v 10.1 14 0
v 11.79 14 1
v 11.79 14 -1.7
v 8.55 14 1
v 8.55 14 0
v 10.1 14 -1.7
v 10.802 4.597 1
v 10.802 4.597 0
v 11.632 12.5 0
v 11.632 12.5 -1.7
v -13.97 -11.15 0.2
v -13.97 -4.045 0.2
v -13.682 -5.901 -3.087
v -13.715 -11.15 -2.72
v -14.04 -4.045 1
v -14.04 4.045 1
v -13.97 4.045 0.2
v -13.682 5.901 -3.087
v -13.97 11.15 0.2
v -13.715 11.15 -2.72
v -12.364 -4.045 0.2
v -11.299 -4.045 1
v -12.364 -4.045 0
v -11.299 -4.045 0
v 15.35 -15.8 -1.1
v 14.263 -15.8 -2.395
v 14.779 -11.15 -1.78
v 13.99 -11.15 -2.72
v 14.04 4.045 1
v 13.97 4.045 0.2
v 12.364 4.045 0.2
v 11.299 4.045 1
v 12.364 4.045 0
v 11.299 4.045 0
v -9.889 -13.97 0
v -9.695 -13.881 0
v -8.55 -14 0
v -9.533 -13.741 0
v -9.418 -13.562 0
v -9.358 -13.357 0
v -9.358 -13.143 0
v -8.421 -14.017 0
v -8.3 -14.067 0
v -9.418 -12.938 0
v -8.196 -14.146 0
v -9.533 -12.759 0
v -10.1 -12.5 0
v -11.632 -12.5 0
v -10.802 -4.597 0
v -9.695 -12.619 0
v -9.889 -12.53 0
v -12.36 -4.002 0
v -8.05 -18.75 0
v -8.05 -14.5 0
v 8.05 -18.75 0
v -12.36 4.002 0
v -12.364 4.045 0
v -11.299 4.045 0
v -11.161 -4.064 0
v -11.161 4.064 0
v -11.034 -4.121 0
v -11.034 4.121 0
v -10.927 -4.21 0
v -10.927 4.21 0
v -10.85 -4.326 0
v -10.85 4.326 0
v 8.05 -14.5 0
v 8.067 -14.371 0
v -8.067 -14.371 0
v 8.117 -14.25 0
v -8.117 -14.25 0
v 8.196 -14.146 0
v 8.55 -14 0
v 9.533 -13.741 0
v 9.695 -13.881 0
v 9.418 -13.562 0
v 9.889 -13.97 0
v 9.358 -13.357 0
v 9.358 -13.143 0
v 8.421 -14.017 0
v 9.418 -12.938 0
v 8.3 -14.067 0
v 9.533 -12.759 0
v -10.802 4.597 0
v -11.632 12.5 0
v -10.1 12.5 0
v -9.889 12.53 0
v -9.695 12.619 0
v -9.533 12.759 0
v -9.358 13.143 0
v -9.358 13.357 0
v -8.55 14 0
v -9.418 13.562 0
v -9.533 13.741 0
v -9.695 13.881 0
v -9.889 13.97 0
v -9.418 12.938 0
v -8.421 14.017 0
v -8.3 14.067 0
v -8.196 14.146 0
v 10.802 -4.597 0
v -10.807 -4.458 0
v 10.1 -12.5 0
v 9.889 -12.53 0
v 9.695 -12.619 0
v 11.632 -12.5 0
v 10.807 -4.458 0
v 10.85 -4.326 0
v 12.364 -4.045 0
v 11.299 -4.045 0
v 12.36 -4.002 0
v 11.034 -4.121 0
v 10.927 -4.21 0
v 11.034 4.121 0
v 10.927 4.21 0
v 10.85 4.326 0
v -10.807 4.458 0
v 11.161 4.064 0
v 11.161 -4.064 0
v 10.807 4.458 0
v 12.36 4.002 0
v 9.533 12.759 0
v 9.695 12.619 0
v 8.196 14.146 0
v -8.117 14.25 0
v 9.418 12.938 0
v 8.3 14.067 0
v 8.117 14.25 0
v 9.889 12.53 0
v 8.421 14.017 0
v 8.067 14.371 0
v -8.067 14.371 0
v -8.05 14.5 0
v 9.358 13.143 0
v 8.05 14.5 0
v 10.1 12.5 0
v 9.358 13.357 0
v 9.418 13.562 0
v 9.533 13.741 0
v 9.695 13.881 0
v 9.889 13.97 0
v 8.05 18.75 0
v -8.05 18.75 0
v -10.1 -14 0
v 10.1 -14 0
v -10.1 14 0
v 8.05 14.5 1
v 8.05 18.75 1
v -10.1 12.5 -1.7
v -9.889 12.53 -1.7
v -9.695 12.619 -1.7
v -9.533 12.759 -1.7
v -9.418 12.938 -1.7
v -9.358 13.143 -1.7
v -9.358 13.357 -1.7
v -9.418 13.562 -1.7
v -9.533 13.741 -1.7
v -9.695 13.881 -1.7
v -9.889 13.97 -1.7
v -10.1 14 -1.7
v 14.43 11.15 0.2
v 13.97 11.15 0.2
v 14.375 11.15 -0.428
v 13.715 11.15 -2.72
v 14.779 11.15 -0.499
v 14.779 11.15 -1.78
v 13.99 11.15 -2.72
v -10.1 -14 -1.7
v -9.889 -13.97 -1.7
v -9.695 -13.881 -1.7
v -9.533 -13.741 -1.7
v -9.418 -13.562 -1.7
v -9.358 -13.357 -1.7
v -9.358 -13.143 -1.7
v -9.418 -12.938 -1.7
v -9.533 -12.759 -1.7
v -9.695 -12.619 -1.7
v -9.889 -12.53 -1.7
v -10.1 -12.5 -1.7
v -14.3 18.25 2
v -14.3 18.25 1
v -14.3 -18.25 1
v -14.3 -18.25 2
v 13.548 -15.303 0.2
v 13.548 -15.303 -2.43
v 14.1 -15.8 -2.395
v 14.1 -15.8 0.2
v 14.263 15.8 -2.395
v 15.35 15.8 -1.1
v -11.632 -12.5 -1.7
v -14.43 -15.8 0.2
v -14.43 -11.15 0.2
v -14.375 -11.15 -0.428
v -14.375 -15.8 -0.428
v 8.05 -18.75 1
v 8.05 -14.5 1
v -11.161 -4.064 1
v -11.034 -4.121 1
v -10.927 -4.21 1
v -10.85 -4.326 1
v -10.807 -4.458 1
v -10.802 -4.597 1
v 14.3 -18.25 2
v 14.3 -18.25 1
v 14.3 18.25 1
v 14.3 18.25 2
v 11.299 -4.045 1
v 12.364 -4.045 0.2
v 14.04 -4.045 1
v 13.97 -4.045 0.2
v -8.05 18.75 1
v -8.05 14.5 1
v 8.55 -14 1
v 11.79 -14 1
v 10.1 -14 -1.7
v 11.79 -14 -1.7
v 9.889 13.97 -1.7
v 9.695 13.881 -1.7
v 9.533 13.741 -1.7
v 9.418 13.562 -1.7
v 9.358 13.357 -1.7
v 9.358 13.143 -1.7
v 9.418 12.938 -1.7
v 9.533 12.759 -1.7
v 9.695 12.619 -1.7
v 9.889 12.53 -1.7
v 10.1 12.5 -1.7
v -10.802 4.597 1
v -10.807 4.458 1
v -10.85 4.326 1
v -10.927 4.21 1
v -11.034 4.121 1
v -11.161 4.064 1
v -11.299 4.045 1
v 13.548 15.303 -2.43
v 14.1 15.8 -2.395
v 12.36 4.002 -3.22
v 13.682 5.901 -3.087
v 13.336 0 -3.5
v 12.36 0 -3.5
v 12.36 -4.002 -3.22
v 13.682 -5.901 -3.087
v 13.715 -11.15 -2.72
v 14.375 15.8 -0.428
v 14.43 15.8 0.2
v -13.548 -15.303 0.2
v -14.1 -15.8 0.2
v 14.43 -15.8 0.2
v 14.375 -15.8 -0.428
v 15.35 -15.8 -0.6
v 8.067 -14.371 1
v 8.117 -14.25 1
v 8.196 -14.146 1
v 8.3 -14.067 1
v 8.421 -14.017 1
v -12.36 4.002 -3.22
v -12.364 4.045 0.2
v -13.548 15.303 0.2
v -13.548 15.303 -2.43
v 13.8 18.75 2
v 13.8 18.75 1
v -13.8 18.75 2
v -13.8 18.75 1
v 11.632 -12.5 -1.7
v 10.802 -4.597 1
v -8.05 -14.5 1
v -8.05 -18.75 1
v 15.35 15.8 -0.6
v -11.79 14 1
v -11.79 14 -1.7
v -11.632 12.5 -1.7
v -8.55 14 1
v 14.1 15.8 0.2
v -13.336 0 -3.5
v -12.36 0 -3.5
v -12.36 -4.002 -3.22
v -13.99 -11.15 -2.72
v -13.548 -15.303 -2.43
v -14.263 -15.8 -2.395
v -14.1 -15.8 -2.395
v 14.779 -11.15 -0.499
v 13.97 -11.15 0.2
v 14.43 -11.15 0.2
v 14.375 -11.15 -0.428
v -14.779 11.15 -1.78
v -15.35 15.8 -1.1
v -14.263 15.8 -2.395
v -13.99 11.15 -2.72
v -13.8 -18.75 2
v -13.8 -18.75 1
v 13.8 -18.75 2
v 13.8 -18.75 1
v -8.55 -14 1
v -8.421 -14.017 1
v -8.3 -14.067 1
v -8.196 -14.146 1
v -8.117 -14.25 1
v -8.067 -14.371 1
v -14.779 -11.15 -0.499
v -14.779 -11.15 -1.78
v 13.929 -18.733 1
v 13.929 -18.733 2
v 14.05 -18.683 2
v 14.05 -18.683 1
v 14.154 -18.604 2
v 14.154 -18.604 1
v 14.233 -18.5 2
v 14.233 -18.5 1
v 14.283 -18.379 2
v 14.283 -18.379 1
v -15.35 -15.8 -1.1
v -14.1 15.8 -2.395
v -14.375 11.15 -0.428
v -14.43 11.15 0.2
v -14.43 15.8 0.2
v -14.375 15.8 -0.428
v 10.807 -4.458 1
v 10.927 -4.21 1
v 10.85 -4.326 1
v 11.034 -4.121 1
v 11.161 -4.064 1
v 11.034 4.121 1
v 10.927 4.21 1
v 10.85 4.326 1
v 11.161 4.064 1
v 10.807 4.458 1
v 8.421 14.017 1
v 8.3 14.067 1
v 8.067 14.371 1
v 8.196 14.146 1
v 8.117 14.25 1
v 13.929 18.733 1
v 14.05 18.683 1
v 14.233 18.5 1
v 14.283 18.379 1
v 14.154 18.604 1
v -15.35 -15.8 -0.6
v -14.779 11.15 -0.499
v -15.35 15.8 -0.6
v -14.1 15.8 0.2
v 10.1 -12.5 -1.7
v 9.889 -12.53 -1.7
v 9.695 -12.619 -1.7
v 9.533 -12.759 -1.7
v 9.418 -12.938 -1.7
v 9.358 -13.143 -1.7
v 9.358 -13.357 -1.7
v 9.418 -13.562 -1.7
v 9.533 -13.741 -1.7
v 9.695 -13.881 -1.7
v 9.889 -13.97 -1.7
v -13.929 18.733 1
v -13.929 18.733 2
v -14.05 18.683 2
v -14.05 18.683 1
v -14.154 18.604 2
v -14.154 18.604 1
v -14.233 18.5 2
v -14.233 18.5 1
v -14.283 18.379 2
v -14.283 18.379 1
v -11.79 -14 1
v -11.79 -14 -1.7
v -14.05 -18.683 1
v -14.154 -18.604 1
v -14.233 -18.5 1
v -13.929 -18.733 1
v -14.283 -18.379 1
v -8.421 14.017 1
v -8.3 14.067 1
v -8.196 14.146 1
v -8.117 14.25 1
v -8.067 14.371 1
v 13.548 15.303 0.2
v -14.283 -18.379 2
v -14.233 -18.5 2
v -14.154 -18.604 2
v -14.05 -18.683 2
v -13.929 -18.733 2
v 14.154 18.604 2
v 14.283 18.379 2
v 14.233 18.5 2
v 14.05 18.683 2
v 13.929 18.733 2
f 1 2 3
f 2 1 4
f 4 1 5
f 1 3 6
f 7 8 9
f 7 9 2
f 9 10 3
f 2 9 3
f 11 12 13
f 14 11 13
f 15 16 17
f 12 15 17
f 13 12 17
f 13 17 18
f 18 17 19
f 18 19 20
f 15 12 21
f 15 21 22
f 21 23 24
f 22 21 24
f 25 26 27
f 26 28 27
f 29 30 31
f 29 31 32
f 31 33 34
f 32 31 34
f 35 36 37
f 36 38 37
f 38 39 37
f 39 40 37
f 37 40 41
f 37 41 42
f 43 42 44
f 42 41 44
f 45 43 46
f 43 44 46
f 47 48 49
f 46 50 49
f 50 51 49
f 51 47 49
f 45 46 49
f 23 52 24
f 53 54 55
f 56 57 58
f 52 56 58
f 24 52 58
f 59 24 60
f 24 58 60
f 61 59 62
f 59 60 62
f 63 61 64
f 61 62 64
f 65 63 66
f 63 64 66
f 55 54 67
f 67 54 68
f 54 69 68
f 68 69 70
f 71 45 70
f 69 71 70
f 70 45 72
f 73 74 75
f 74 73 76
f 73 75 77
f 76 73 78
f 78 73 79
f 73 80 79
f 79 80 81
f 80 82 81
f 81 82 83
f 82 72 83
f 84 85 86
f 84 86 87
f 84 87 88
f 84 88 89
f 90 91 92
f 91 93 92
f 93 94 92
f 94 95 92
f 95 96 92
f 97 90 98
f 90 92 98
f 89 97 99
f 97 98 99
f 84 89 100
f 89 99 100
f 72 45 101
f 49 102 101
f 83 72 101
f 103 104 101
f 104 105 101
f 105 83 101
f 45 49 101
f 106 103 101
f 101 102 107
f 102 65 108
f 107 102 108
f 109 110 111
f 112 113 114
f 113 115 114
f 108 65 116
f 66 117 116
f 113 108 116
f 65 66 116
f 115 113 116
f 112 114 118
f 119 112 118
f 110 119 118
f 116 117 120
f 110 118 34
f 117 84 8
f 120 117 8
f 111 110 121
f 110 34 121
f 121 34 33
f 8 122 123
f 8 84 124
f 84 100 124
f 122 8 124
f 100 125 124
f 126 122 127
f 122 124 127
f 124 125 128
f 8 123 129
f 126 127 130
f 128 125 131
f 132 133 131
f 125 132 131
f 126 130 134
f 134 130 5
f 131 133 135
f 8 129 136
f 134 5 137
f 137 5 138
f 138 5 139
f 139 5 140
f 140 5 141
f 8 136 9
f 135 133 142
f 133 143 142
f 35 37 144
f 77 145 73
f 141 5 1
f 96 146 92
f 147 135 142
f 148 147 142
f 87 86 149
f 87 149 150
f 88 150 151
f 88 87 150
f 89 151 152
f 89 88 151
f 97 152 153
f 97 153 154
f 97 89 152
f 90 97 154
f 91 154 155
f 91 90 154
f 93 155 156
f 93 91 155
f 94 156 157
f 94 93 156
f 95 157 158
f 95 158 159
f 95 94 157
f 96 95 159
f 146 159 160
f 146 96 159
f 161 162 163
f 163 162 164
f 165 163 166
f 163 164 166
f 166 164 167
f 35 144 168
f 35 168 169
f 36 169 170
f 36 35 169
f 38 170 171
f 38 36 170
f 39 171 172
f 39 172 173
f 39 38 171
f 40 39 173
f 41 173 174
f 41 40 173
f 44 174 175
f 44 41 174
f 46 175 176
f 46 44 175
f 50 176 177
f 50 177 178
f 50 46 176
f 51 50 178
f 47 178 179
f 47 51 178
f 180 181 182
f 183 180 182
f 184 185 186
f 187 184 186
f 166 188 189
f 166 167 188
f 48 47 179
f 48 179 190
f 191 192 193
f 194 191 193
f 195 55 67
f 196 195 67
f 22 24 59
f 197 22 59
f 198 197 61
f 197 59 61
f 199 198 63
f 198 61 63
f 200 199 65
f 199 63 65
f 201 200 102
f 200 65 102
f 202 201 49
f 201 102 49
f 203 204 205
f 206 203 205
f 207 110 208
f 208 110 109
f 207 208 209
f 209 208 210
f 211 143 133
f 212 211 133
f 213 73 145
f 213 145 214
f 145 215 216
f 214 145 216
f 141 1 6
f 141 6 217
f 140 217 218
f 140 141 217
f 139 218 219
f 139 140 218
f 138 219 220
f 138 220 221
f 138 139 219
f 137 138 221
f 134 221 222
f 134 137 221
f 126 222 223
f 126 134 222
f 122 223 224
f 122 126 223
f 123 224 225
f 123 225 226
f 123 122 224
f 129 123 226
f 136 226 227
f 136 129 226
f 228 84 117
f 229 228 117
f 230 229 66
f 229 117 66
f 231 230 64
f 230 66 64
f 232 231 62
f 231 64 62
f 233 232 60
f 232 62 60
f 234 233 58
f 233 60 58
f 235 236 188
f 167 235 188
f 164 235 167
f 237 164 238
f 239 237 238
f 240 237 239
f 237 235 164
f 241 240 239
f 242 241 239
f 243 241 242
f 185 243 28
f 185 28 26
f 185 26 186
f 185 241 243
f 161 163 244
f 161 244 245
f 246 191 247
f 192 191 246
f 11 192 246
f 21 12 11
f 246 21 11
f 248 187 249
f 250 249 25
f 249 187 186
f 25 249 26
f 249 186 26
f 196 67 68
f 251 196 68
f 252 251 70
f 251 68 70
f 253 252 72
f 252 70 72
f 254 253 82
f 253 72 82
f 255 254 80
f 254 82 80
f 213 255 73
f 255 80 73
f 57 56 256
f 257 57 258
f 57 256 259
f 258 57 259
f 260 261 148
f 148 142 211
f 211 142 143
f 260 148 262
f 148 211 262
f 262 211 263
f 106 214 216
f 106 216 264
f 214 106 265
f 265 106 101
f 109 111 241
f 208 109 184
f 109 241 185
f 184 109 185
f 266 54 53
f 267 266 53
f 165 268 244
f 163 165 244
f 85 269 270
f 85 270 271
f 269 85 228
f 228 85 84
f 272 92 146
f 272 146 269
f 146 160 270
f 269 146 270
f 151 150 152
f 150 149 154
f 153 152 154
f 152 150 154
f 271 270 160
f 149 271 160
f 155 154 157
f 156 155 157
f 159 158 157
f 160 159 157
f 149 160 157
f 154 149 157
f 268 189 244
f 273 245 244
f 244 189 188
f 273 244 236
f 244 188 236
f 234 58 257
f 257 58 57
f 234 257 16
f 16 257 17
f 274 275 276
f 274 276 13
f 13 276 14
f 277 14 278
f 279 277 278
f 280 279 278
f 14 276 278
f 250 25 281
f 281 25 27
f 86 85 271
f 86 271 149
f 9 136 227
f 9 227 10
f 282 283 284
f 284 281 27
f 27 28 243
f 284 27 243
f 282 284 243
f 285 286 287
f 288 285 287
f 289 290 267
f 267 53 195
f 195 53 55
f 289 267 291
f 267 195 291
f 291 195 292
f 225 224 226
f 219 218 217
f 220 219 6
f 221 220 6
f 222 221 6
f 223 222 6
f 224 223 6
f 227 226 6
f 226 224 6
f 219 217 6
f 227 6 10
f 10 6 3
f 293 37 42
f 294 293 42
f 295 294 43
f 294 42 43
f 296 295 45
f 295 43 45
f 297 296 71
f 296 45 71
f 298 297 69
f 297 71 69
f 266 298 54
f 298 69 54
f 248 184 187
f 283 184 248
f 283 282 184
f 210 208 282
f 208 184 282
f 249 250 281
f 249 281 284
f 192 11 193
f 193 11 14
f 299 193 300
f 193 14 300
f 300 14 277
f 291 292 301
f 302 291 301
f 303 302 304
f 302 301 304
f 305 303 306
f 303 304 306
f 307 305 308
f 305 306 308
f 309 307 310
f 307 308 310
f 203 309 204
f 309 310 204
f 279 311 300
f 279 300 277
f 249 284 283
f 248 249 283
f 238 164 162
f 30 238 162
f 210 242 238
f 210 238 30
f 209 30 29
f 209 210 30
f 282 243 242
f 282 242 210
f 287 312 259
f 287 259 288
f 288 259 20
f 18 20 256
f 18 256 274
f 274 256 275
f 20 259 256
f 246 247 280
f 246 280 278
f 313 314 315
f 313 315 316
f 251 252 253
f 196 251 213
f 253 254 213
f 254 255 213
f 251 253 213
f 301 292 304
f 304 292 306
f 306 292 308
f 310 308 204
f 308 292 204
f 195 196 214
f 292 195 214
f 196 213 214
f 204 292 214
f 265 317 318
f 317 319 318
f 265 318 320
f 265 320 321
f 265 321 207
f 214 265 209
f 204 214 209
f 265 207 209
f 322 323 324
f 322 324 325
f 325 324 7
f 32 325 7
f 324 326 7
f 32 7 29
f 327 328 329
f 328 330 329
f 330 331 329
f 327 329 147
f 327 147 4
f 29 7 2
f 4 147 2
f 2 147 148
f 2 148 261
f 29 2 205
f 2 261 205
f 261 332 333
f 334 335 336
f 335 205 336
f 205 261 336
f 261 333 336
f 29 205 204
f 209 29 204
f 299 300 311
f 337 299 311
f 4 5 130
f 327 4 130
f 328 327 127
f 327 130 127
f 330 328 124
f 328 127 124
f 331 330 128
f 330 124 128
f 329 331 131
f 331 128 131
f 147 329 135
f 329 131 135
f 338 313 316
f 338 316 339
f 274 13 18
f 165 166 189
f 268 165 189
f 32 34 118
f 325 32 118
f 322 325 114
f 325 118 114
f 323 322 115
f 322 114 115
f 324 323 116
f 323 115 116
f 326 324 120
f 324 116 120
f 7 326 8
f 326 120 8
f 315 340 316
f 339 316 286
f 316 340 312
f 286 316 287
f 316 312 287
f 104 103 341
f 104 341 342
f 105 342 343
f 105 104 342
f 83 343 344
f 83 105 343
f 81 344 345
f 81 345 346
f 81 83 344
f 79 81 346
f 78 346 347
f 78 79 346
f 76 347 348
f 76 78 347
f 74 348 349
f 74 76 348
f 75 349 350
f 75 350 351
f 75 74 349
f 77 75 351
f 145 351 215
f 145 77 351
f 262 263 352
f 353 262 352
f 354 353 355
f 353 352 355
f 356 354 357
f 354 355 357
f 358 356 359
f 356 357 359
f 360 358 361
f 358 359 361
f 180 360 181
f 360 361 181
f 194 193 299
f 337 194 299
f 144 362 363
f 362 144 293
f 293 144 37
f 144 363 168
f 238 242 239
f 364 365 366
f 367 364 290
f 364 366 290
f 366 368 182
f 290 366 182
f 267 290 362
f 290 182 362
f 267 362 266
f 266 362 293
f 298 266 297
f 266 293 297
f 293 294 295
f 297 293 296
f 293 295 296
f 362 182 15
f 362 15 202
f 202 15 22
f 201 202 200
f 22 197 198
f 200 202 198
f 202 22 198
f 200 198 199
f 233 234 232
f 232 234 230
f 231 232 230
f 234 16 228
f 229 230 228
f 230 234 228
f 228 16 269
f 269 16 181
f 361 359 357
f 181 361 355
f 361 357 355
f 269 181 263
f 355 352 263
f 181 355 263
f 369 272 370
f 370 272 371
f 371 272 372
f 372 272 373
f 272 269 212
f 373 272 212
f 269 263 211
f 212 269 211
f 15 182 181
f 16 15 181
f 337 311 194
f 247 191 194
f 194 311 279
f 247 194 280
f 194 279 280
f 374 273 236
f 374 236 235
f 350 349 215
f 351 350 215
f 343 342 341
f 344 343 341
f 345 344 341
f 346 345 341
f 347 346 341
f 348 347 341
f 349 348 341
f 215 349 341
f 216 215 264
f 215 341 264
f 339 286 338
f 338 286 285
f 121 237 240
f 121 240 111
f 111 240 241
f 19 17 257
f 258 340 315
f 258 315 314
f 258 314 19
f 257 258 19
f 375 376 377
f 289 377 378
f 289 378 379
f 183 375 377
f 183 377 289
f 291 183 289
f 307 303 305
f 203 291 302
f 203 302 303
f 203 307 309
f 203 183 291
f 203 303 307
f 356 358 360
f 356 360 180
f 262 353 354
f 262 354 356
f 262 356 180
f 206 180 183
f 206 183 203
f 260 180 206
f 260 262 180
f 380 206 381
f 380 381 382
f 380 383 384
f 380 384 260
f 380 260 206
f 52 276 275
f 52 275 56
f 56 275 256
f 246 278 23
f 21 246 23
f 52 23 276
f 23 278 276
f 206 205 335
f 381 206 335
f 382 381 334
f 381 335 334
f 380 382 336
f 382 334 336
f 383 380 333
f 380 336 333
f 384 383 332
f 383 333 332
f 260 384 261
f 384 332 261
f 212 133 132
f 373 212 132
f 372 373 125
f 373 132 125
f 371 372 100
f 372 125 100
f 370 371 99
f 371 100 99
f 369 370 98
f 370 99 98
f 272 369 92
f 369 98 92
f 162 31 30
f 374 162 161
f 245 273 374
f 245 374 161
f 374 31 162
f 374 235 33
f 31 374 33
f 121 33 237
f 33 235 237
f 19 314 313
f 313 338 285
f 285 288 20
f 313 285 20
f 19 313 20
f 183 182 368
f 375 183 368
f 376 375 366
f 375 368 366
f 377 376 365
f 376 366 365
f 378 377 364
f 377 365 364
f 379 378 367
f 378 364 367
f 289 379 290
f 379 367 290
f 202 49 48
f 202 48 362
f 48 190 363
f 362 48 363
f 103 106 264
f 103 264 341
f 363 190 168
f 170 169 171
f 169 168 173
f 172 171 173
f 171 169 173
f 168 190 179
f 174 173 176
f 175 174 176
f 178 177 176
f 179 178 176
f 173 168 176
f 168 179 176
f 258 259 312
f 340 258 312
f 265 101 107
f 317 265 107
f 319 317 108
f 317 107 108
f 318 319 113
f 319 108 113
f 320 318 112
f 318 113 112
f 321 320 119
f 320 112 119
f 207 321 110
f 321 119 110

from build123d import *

# Parameters (mm, degrees)
BOSS_EXTRUDE1_DEPTH      = 2
BOSS_EXTRUDE2_DEPTH      = 1.7
BOSS_EXTRUDE2_DEPTH_BACK = 1.7
BOSS_EXTRUDE3_DEPTH      = 1.7
BOSS_EXTRUDE3_DEPTH_BACK = 1.7
BOSS_EXTRUDE4_DEPTH      = 1.7
BOSS_EXTRUDE4_DEPTH_BACK = 1.7
BOSS_EXTRUDE5_DEPTH      = 1.7
BOSS_EXTRUDE5_DEPTH_BACK = 1.7
SKETCH6_W                = 38.6
SKETCH6_H                = 47.5
CUT_EXTRUDE1_DEPTH       = 4
BOSS_EXTRUDE6_DEPTH      = 3.8
BOSS_EXTRUDE7_DEPTH      = 3.8
CUT_EXTRUDE2_DEPTH       = 20
CUT_EXTRUDE2_DEPTH_BACK  = 20
CUT_EXTRUDE3_DEPTH       = 11.15
CUT_EXTRUDE3_DEPTH_BACK  = 11.15
CUT_EXTRUDE4_DEPTH       = 11.15
CUT_EXTRUDE4_DEPTH_BACK  = 11.15
CUT_EXTRUDE5_DEPTH       = 16
CUT_EXTRUDE5_DEPTH_BACK  = 16
CUT_EXTRUDE6_DEPTH       = 16
CUT_EXTRUDE6_DEPTH_BACK  = 16


with BuildPart() as part:
    # Sketch1 → Boss-Extrude1 (new body)
    with BuildSketch(Plane.XY):
        with BuildLine():
            Line((-14.3, 18.25), (-14.3, -18.25))
            ThreePointArc((-14.3, -18.25), (-14.153553391, -18.603553391), (-13.8, -18.75))
            Line((-13.8, -18.75), (13.8, -18.75))
            ThreePointArc((13.8, -18.75), (14.153553391, -18.603553391), (14.3, -18.25))
            Line((14.3, -18.25), (14.3, 18.25))
            ThreePointArc((14.3, 18.25), (14.153553391, 18.603553391), (13.8, 18.75))
            Line((13.8, 18.75), (-13.8, 18.75))
            ThreePointArc((-13.8, 18.75), (-14.153553391, 18.603553391), (-14.3, 18.25))
        make_face()
    extrude(amount=BOSS_EXTRUDE1_DEPTH)

    # Sketch2 → Boss-Extrude2 (add, two sides: drawn at the far end of the back side and taken through both)
    with BuildSketch(Plane.XY.offset(-BOSS_EXTRUDE2_DEPTH_BACK)):
        with BuildLine():
            Line((-13.1, 12.5), (-10.1, 12.5))
            ThreePointArc((-10.1, 12.5), (-9.35, 13.25), (-10.1, 14))
            Line((-10.1, 14), (-13.1, 14))
            Line((-13.1, 14), (-13.1, 12.5))
        make_face()
    extrude(amount=BOSS_EXTRUDE2_DEPTH + BOSS_EXTRUDE2_DEPTH_BACK)

    # Sketch3 → Boss-Extrude3 (add, two sides: drawn at the far end of the back side and taken through both)
    with BuildSketch(Plane.XY.offset(-BOSS_EXTRUDE3_DEPTH_BACK)):
        with BuildLine():
            Line((10.1, -14), (13.1, -14))
            Line((13.1, -14), (13.1, -12.5))
            Line((13.1, -12.5), (10.1, -12.5))
            ThreePointArc((10.1, -12.5), (9.35, -13.25), (10.1, -14))
        make_face()
    extrude(amount=BOSS_EXTRUDE3_DEPTH + BOSS_EXTRUDE3_DEPTH_BACK)

    # Sketch4 → Boss-Extrude4 (add, two sides: drawn at the far end of the back side and taken through both)
    with BuildSketch(Plane.XY.offset(-BOSS_EXTRUDE4_DEPTH_BACK)):
        with BuildLine():
            Line((-13.1, -12.5), (-13.1, -14))
            Line((-13.1, -14), (-10.1, -14))
            ThreePointArc((-10.1, -14), (-9.35, -13.25), (-10.1, -12.5))
            Line((-10.1, -12.5), (-13.1, -12.5))
        make_face()
    extrude(amount=BOSS_EXTRUDE4_DEPTH + BOSS_EXTRUDE4_DEPTH_BACK)

    # Sketch5 → Boss-Extrude5 (add, two sides: drawn at the far end of the back side and taken through both)
    with BuildSketch(Plane.XY.offset(-BOSS_EXTRUDE5_DEPTH_BACK)):
        with BuildLine():
            Line((10.1, 12.5), (13.1, 12.5))
            Line((13.1, 12.5), (13.1, 14))
            Line((13.1, 14), (10.1, 14))
            ThreePointArc((10.1, 14), (9.35, 13.25), (10.1, 12.5))
        make_face()
    extrude(amount=BOSS_EXTRUDE5_DEPTH + BOSS_EXTRUDE5_DEPTH_BACK)

    # Sketch6 → Cut-Extrude1 (cut)
    with BuildSketch(Plane.XY.offset(-3)):
        Rectangle(SKETCH6_W, SKETCH6_H)
        with BuildLine():
            Line((-14.3, -4.045), (-11.298993595, -4.045))
            ThreePointArc((-11.298993595, -4.045), (-10.927421183, -4.210434697), (-10.801732648, -4.597264232))
            Line((-10.801732648, -4.597264232), (-11.79, -14))
            Line((-11.79, -14), (-8.55, -14))
            ThreePointArc((-8.55, -14), (-8.196446609, -14.146446609), (-8.05, -14.5))
            Line((-8.05, -14.5), (-8.05, -18.75))
            Line((-8.05, -18.75), (8.05, -18.75))
            Line((8.05, -18.75), (8.05, -14.5))
            ThreePointArc((8.05, -14.5), (8.196446609, -14.146446609), (8.55, -14))
            Line((8.55, -14), (11.79, -14))
            Line((11.79, -14), (10.801732648, -4.597264232))
            ThreePointArc((10.801732648, -4.597264232), (10.927421183, -4.210434697), (11.298993595, -4.045))
            Line((11.298993595, -4.045), (14.3, -4.045))
            Line((14.3, -4.045), (14.3, 4.045))
            Line((14.3, 4.045), (11.298993595, 4.045))
            ThreePointArc((11.298993595, 4.045), (10.927421183, 4.210434697), (10.801732648, 4.597264232))
            Line((10.801732648, 4.597264232), (11.79, 14))
            Line((11.79, 14), (8.55, 14))
            ThreePointArc((8.55, 14), (8.196446609, 14.146446609), (8.05, 14.5))
            Line((8.05, 14.5), (8.05, 18.75))
            Line((8.05, 18.75), (-8.05, 18.75))
            Line((-8.05, 18.75), (-8.05, 14.5))
            ThreePointArc((-8.05, 14.5), (-8.196446609, 14.146446609), (-8.55, 14))
            Line((-8.55, 14), (-11.79, 14))
            Line((-11.79, 14), (-10.801732648, 4.597264232))
            ThreePointArc((-10.801732648, 4.597264232), (-10.927421183, 4.210434697), (-11.298993595, 4.045))
            Line((-11.298993595, 4.045), (-14.3, 4.045))
            Line((-14.3, 4.045), (-14.3, -4.045))
        make_face(mode=Mode.SUBTRACT)
    extrude(amount=CUT_EXTRUDE1_DEPTH, mode=Mode.SUBTRACT)

    # Sketch7 → Boss-Extrude6 (add)
    with BuildSketch(Plane.XY.offset(-3.6)):
        Polygon((12.36, -4.002188077), (13.547735768, -15.302739052), (14.1, -15.8), (15.35, -15.8), (14.779051792, -11.15), (14.04, -11.15), (14.04, 11.15), (14.779051792, 11.15), (15.35, 15.8), (14.1, 15.8), (13.547735768, 15.302739052), (12.36, 4.002188077), align=None)
    extrude(amount=BOSS_EXTRUDE6_DEPTH)

    # Sketch8 → Boss-Extrude7 (add)
    with BuildSketch(Plane.XY.offset(-3.6)):
        Polygon((-15.35, -15.8), (-14.1, -15.8), (-13.547735768, -15.302739052), (-12.36, -4.002188077), (-12.36, 4.002188077), (-13.547735768, 15.302739052), (-14.1, 15.8), (-15.35, 15.8), (-14.779051792, 11.15), (-14.04, 11.15), (-14.04, -11.15), (-14.779051792, -11.15), align=None)
    extrude(amount=BOSS_EXTRUDE7_DEPTH)

    # Sketch9 → Cut-Extrude2 (cut, two sides: drawn at the far end of the back side and taken through both)
    with BuildSketch(Plane(origin=(0, 0, 0), x_dir=(0, 0, -1), z_dir=(1, 0, 0)).offset(-CUT_EXTRUDE2_DEPTH_BACK)):
        Polygon((2.395156371, -15.8), (8.5, -15.8), (8.5, 15.8), (2.395156371, 15.8), (3.5, 0), align=None)
    extrude(amount=CUT_EXTRUDE2_DEPTH + CUT_EXTRUDE2_DEPTH_BACK, mode=Mode.SUBTRACT)

    # Sketch10 → Cut-Extrude3 (cut, two sides: drawn at the far end of the back side and taken through both)
    with BuildSketch(Plane(origin=(0, 0, 0), x_dir=(1, 0, 0), z_dir=(0, 1, 0)).offset(-CUT_EXTRUDE3_DEPTH_BACK)):
        Polygon((13.602556682, 4), (14.04, -1), (14.3, -1), (14.3, 4), align=None)
    extrude(amount=CUT_EXTRUDE3_DEPTH + CUT_EXTRUDE3_DEPTH_BACK, mode=Mode.SUBTRACT)

    # Sketch11 → Cut-Extrude4 (cut, two sides: drawn at the far end of the back side and taken through both)
    with BuildSketch(Plane(origin=(0, 0, 0), x_dir=(1, 0, 0), z_dir=(0, 1, 0)).offset(-CUT_EXTRUDE4_DEPTH_BACK)):
        Polygon((-14.3, 4), (-14.3, -1), (-14.04, -1), (-13.602556682, 4), align=None)
    extrude(amount=CUT_EXTRUDE4_DEPTH + CUT_EXTRUDE4_DEPTH_BACK, mode=Mode.SUBTRACT)

    # Sketch12 → Cut-Extrude5 (cut, two sides: drawn at the far end of the back side and taken through both)
    with BuildSketch(Plane(origin=(0, 0, 0), x_dir=(1, 0, 0), z_dir=(0, 1, 0)).offset(-CUT_EXTRUDE5_DEPTH_BACK)):
        Polygon((12.35, 4.8), (12.35, 4.675260778), (15.35, 1.1), (15.35, 0.6), (14.375049256, 0.428089879), (14.43, -0.2), (17.35, -0.2), (17.35, 4.8), align=None)
    extrude(amount=CUT_EXTRUDE5_DEPTH + CUT_EXTRUDE5_DEPTH_BACK, mode=Mode.SUBTRACT)

    # Sketch13 → Cut-Extrude6 (cut, two sides: drawn at the far end of the back side and taken through both)
    with BuildSketch(Plane(origin=(0, 0, 0), x_dir=(1, 0, 0), z_dir=(0, 1, 0)).offset(-CUT_EXTRUDE6_DEPTH_BACK)):
        Polygon((-17.35, 4.8), (-17.35, -0.2), (-14.43, -0.2), (-14.375049256, 0.428089879), (-15.35, 0.6), (-15.35, 1.1), (-12.35, 4.675260778), (-12.35, 4.8), align=None)
    extrude(amount=CUT_EXTRUDE6_DEPTH + CUT_EXTRUDE6_DEPTH_BACK, mode=Mode.SUBTRACT)


solid = part.part
